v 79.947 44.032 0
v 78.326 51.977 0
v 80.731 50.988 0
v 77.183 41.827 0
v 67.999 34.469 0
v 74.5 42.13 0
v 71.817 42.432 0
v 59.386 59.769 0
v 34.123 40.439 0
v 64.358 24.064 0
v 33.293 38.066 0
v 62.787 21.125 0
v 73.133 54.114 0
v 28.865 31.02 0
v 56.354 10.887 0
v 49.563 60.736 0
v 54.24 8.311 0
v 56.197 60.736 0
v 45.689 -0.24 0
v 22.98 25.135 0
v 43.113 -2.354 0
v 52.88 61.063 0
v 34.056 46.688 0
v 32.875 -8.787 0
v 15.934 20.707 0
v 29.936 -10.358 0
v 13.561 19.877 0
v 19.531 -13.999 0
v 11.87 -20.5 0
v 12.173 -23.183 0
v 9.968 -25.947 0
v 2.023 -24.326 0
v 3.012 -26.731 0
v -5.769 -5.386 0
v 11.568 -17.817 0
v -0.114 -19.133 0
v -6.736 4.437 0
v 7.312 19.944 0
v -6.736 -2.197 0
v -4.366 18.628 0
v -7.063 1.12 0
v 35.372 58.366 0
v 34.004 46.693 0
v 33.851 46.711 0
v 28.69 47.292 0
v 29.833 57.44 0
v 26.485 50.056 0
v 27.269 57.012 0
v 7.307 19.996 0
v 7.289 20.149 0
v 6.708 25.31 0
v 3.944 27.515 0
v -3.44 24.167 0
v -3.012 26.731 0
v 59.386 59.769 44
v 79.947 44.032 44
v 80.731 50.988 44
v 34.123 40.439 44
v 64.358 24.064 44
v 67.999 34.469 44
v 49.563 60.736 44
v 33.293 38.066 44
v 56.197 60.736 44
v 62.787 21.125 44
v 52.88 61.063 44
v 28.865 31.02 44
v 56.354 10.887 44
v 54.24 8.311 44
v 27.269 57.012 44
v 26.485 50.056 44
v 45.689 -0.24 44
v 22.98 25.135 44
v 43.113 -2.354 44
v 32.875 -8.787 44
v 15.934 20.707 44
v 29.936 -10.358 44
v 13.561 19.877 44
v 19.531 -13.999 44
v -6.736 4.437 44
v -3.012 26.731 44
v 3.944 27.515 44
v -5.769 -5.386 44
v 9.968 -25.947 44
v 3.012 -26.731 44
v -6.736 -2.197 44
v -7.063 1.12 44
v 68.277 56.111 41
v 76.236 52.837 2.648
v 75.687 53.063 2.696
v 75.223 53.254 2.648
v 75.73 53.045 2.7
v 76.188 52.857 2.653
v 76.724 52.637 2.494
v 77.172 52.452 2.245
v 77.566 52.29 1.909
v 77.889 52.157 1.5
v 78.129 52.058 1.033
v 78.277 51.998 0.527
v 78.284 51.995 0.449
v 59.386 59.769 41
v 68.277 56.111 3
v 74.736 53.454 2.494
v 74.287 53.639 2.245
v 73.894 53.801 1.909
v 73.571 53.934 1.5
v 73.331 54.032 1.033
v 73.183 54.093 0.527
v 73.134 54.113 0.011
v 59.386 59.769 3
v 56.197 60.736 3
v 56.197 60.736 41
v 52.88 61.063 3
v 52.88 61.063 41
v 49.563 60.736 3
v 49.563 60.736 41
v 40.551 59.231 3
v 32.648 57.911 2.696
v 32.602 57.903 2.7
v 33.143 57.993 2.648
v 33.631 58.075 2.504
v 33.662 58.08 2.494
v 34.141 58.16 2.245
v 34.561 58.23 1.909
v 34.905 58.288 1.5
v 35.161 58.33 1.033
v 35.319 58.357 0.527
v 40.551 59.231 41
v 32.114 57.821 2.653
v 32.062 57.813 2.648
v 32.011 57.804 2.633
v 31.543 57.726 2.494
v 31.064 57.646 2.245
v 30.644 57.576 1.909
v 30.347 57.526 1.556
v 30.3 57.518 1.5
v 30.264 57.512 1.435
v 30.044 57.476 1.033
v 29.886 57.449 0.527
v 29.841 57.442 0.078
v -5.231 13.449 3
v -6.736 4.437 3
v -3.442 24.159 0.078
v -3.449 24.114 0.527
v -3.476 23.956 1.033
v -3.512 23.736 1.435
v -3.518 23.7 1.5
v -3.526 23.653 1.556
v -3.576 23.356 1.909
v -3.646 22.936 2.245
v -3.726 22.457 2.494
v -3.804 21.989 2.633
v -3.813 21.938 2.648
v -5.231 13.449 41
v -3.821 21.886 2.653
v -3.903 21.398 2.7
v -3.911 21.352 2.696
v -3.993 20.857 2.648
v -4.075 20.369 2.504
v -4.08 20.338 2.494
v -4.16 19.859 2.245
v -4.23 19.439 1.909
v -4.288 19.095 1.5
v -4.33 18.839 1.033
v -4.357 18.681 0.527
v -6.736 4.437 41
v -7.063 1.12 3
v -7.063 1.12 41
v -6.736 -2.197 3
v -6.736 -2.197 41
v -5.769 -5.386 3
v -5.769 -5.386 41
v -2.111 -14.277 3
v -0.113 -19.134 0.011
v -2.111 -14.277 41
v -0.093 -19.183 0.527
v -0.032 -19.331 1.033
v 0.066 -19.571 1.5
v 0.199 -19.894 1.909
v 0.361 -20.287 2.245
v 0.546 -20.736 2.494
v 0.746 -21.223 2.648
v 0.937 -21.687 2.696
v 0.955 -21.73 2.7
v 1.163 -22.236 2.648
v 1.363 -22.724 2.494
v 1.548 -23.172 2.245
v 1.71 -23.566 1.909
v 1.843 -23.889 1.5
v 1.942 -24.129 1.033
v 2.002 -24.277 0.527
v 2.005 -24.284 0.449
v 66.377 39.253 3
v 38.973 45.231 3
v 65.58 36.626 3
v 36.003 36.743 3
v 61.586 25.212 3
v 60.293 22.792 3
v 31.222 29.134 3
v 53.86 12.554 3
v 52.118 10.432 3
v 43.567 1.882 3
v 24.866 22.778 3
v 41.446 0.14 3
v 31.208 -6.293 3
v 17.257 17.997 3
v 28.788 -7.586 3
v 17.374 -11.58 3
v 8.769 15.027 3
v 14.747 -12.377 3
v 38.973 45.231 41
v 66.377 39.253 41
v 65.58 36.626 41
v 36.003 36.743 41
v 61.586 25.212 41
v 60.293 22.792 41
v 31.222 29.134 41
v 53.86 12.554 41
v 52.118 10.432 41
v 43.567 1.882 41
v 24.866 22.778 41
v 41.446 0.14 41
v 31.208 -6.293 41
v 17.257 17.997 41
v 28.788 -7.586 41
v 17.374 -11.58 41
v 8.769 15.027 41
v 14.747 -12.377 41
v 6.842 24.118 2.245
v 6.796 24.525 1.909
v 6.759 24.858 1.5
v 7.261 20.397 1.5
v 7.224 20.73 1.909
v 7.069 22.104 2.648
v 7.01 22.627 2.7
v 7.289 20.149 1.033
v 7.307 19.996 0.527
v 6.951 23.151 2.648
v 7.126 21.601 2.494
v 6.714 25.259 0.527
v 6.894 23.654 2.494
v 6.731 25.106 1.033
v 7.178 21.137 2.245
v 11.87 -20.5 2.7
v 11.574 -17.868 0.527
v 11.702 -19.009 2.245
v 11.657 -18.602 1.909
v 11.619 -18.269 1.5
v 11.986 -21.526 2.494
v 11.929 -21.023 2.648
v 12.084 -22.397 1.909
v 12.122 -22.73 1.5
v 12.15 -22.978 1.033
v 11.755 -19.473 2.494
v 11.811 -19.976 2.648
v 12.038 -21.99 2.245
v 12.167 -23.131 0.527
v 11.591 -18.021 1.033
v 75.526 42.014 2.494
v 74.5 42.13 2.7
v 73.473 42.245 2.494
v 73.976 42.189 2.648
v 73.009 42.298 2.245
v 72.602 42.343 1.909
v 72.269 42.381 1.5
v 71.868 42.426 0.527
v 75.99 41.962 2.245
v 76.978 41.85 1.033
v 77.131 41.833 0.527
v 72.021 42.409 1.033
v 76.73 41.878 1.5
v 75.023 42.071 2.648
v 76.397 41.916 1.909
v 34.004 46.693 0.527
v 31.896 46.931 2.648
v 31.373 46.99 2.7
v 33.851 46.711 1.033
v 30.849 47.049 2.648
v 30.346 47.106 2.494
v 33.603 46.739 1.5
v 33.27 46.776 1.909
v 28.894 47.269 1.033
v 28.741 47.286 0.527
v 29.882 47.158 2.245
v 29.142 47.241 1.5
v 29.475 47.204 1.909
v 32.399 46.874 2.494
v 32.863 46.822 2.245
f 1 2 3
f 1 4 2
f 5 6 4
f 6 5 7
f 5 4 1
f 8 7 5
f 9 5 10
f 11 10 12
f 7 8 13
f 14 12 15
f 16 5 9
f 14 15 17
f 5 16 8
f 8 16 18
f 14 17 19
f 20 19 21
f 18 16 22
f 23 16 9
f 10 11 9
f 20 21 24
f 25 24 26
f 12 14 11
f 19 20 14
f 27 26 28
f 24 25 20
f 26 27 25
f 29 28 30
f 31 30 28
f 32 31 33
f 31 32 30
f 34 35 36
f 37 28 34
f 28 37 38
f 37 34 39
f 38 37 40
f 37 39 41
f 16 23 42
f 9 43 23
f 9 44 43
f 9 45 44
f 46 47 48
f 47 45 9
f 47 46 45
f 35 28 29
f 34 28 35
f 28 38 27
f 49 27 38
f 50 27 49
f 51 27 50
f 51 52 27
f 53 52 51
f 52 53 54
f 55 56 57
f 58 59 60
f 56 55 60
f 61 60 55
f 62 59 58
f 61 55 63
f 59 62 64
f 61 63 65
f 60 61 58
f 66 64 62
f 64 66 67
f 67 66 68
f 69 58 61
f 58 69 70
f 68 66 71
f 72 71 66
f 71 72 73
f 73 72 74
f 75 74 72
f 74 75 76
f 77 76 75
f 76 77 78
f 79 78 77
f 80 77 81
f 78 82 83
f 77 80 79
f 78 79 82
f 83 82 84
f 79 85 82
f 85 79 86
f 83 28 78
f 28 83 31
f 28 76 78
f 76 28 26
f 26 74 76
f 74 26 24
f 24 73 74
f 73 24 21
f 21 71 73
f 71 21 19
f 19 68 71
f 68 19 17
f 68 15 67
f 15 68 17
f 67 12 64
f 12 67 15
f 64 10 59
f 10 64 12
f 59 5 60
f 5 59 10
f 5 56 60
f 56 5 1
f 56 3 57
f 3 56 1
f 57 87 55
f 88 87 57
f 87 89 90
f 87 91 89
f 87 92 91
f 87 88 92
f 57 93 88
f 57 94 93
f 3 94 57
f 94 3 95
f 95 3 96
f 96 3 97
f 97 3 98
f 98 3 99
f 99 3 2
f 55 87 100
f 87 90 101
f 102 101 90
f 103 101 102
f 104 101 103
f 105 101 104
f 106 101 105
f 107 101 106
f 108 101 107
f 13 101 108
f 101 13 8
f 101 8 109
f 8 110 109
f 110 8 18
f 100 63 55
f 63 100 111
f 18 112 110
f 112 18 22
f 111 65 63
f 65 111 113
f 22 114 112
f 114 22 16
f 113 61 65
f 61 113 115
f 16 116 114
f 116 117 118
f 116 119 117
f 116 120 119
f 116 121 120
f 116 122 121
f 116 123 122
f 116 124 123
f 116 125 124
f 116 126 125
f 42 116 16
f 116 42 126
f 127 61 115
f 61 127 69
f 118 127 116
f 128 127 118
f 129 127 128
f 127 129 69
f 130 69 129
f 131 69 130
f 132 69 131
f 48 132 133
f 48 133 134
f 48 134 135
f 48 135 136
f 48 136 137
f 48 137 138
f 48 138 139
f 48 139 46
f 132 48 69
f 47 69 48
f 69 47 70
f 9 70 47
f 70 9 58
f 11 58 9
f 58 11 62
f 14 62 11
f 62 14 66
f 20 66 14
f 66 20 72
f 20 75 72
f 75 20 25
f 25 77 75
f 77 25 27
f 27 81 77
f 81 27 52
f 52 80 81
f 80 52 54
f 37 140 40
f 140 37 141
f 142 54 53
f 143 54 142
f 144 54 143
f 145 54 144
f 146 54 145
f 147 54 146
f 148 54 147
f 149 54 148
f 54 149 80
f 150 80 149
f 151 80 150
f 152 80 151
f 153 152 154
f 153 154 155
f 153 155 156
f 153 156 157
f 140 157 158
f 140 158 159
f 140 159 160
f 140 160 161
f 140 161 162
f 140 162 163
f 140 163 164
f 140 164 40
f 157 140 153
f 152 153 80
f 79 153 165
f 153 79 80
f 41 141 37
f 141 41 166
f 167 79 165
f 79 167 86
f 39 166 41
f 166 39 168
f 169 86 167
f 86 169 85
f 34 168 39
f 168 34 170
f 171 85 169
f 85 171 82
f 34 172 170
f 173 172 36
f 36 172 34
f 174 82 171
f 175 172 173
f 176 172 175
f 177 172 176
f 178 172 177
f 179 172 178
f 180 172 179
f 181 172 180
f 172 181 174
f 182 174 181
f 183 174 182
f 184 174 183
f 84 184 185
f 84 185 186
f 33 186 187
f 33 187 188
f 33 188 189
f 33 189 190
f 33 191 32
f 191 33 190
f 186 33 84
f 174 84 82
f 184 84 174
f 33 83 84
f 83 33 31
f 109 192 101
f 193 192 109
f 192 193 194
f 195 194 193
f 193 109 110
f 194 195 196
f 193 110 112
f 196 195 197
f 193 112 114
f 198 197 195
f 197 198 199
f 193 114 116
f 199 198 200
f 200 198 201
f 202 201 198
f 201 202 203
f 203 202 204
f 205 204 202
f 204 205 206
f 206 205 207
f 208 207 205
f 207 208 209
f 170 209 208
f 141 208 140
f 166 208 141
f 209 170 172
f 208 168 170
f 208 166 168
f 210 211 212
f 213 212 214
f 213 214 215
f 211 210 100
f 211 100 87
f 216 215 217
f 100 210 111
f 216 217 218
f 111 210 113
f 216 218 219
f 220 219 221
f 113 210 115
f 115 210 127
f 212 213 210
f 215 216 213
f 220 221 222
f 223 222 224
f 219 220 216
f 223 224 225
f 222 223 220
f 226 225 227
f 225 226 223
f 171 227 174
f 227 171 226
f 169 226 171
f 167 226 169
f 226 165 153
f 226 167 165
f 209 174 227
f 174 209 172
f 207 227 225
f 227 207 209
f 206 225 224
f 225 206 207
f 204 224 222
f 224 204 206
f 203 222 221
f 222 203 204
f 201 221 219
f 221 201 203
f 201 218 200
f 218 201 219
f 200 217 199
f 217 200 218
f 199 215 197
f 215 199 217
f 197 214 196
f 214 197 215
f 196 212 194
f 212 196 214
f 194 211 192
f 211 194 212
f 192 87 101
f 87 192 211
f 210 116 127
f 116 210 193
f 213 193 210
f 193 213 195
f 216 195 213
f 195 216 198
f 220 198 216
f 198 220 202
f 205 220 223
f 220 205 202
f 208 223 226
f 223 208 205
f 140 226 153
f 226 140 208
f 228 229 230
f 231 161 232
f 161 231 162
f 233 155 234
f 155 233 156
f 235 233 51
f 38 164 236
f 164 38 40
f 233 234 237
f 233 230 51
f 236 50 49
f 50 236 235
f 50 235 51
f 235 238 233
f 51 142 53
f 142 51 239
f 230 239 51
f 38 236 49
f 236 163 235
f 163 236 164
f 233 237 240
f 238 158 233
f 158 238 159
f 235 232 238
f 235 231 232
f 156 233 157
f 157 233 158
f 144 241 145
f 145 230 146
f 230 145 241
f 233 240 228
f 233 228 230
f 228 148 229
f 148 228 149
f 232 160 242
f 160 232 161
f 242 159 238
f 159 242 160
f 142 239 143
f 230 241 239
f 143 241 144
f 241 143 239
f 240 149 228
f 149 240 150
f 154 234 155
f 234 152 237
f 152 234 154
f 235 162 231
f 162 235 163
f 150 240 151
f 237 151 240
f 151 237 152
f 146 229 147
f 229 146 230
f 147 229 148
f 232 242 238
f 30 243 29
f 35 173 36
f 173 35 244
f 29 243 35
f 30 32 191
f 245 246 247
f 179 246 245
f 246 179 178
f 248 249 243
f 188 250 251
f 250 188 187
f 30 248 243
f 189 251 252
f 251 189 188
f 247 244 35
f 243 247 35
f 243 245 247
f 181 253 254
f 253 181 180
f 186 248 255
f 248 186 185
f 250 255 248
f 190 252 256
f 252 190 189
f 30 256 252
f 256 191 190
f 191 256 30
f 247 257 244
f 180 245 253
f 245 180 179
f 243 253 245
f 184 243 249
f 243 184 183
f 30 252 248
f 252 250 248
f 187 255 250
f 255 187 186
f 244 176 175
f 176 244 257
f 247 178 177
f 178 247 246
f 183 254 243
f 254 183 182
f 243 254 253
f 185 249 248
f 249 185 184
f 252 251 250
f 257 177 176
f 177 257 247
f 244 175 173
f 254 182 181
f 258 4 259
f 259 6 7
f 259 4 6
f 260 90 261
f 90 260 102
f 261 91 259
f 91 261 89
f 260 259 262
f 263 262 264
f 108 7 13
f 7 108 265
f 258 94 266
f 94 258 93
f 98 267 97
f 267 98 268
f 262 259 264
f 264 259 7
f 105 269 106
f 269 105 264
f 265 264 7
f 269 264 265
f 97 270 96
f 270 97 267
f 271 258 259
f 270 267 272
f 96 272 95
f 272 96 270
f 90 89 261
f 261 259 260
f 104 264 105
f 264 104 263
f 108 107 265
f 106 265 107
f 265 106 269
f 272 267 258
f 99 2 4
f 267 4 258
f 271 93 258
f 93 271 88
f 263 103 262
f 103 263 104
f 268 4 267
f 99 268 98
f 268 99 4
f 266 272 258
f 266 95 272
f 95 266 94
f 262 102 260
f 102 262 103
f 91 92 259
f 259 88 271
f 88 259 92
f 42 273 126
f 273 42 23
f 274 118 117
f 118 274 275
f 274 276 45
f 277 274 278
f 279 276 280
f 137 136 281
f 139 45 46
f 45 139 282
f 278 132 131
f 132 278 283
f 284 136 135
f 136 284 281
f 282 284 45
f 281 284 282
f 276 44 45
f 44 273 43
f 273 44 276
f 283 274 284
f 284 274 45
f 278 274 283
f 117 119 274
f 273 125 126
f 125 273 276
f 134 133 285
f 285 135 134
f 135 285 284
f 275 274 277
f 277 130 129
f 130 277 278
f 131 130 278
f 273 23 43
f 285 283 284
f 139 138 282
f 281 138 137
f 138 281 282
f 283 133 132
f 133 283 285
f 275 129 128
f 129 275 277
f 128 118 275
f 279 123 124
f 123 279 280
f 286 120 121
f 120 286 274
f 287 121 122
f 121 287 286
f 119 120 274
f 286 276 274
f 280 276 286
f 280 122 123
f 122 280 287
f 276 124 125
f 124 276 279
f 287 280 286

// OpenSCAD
$fn = 32;

// ----------------------------------------------------------------------
// Air duct: 34 mm duct, 3 mm wall, 44 mm across
// ----------------------------------------------------------------------

// --- parameters (mm) ---
duct_r = 17;              // duct core radius
duct_d = 34;              // duct core diameter
wall = 3;                 // duct wall thickness
height = 44;              // duct width (extrusion height)
port_r = 26.9;            // port flange half width
port_d = 53.8;            // port flange width
port_t = 7;               // port flange thickness
bolt_d = 5.4;             // port bolt holes
bolt_offset = 21.7;       // bolt hole offset from the port axis

difference() {
  /* outer hull chain: tube with a flat flange plate at every port */
  linear_extrude(height = 44) {
    hull() {
      polygon([[3.012, -26.731], [-3.012, 26.731], [3.944, 27.515], [9.968, -25.947]]);
      translate([9.937, 1.12]) circle(r = 17);
    }
    hull() {
      translate([9.937, 1.12]) circle(r = 17);
      translate([12.016, 1.354]) circle(r = 17);
    }
    hull() {
      translate([12.016, 1.354]) circle(r = 17);
      translate([23.43, 5.348]) circle(r = 17);
    }
    hull() {
      translate([23.43, 5.348]) circle(r = 17);
      translate([33.668, 11.781]) circle(r = 17);
    }
    hull() {
      translate([33.668, 11.781]) circle(r = 17);
      translate([42.219, 20.332]) circle(r = 17);
    }
    hull() {
      translate([42.219, 20.332]) circle(r = 17);
      translate([48.652, 30.57]) circle(r = 17);
    }
    hull() {
      translate([48.652, 30.57]) circle(r = 17);
      translate([52.646, 41.984]) circle(r = 17);
    }
    hull() {
      translate([52.646, 41.984]) circle(r = 17);
      translate([52.88, 44.063]) circle(r = 17);
    }
    hull() {
      translate([52.88, 44.063]) circle(r = 17);
      polygon([[27.269, 57.012], [80.731, 50.988], [79.947, 44.032], [26.485, 50.056]]);
    }
  }
  /* air passage: the same chain inset by the wall, 5 mm proud of the ports */
  translate([0, 0, 3]) linear_extrude(height = 38) {
    hull() {
      translate([-4.969, -0.56]) circle(r = 14);
      translate([12.016, 1.354]) circle(r = 14);
    }
    hull() {
      translate([12.016, 1.354]) circle(r = 14);
      translate([23.43, 5.348]) circle(r = 14);
    }
    hull() {
      translate([23.43, 5.348]) circle(r = 14);
      translate([33.668, 11.781]) circle(r = 14);
    }
    hull() {
      translate([33.668, 11.781]) circle(r = 14);
      translate([42.219, 20.332]) circle(r = 14);
    }
    hull() {
      translate([42.219, 20.332]) circle(r = 14);
      translate([48.652, 30.57]) circle(r = 14);
    }
    hull() {
      translate([48.652, 30.57]) circle(r = 14);
      translate([52.646, 41.984]) circle(r = 14);
    }
    hull() {
      translate([52.646, 41.984]) circle(r = 14);
      translate([54.56, 58.969]) circle(r = 14);
    }
  }
  translate([0, 0]) rotate([0, 0, -83.57]) translate([-21.7, -2.5]) rotate([-90, 0, 0]) cylinder(h = 12, d = 5.4);
  translate([0, 0]) rotate([0, 0, -83.57]) translate([21.7, -2.5]) rotate([-90, 0, 0]) cylinder(h = 12, d = 5.4);
  translate([54, 54]) rotate([0, 0, 173.57]) translate([-21.7, -2.5]) rotate([-90, 0, 0]) cylinder(h = 12, d = 5.4);
  translate([54, 54]) rotate([0, 0, 173.57]) translate([21.7, -2.5]) rotate([-90, 0, 0]) cylinder(h = 12, d = 5.4);
}
